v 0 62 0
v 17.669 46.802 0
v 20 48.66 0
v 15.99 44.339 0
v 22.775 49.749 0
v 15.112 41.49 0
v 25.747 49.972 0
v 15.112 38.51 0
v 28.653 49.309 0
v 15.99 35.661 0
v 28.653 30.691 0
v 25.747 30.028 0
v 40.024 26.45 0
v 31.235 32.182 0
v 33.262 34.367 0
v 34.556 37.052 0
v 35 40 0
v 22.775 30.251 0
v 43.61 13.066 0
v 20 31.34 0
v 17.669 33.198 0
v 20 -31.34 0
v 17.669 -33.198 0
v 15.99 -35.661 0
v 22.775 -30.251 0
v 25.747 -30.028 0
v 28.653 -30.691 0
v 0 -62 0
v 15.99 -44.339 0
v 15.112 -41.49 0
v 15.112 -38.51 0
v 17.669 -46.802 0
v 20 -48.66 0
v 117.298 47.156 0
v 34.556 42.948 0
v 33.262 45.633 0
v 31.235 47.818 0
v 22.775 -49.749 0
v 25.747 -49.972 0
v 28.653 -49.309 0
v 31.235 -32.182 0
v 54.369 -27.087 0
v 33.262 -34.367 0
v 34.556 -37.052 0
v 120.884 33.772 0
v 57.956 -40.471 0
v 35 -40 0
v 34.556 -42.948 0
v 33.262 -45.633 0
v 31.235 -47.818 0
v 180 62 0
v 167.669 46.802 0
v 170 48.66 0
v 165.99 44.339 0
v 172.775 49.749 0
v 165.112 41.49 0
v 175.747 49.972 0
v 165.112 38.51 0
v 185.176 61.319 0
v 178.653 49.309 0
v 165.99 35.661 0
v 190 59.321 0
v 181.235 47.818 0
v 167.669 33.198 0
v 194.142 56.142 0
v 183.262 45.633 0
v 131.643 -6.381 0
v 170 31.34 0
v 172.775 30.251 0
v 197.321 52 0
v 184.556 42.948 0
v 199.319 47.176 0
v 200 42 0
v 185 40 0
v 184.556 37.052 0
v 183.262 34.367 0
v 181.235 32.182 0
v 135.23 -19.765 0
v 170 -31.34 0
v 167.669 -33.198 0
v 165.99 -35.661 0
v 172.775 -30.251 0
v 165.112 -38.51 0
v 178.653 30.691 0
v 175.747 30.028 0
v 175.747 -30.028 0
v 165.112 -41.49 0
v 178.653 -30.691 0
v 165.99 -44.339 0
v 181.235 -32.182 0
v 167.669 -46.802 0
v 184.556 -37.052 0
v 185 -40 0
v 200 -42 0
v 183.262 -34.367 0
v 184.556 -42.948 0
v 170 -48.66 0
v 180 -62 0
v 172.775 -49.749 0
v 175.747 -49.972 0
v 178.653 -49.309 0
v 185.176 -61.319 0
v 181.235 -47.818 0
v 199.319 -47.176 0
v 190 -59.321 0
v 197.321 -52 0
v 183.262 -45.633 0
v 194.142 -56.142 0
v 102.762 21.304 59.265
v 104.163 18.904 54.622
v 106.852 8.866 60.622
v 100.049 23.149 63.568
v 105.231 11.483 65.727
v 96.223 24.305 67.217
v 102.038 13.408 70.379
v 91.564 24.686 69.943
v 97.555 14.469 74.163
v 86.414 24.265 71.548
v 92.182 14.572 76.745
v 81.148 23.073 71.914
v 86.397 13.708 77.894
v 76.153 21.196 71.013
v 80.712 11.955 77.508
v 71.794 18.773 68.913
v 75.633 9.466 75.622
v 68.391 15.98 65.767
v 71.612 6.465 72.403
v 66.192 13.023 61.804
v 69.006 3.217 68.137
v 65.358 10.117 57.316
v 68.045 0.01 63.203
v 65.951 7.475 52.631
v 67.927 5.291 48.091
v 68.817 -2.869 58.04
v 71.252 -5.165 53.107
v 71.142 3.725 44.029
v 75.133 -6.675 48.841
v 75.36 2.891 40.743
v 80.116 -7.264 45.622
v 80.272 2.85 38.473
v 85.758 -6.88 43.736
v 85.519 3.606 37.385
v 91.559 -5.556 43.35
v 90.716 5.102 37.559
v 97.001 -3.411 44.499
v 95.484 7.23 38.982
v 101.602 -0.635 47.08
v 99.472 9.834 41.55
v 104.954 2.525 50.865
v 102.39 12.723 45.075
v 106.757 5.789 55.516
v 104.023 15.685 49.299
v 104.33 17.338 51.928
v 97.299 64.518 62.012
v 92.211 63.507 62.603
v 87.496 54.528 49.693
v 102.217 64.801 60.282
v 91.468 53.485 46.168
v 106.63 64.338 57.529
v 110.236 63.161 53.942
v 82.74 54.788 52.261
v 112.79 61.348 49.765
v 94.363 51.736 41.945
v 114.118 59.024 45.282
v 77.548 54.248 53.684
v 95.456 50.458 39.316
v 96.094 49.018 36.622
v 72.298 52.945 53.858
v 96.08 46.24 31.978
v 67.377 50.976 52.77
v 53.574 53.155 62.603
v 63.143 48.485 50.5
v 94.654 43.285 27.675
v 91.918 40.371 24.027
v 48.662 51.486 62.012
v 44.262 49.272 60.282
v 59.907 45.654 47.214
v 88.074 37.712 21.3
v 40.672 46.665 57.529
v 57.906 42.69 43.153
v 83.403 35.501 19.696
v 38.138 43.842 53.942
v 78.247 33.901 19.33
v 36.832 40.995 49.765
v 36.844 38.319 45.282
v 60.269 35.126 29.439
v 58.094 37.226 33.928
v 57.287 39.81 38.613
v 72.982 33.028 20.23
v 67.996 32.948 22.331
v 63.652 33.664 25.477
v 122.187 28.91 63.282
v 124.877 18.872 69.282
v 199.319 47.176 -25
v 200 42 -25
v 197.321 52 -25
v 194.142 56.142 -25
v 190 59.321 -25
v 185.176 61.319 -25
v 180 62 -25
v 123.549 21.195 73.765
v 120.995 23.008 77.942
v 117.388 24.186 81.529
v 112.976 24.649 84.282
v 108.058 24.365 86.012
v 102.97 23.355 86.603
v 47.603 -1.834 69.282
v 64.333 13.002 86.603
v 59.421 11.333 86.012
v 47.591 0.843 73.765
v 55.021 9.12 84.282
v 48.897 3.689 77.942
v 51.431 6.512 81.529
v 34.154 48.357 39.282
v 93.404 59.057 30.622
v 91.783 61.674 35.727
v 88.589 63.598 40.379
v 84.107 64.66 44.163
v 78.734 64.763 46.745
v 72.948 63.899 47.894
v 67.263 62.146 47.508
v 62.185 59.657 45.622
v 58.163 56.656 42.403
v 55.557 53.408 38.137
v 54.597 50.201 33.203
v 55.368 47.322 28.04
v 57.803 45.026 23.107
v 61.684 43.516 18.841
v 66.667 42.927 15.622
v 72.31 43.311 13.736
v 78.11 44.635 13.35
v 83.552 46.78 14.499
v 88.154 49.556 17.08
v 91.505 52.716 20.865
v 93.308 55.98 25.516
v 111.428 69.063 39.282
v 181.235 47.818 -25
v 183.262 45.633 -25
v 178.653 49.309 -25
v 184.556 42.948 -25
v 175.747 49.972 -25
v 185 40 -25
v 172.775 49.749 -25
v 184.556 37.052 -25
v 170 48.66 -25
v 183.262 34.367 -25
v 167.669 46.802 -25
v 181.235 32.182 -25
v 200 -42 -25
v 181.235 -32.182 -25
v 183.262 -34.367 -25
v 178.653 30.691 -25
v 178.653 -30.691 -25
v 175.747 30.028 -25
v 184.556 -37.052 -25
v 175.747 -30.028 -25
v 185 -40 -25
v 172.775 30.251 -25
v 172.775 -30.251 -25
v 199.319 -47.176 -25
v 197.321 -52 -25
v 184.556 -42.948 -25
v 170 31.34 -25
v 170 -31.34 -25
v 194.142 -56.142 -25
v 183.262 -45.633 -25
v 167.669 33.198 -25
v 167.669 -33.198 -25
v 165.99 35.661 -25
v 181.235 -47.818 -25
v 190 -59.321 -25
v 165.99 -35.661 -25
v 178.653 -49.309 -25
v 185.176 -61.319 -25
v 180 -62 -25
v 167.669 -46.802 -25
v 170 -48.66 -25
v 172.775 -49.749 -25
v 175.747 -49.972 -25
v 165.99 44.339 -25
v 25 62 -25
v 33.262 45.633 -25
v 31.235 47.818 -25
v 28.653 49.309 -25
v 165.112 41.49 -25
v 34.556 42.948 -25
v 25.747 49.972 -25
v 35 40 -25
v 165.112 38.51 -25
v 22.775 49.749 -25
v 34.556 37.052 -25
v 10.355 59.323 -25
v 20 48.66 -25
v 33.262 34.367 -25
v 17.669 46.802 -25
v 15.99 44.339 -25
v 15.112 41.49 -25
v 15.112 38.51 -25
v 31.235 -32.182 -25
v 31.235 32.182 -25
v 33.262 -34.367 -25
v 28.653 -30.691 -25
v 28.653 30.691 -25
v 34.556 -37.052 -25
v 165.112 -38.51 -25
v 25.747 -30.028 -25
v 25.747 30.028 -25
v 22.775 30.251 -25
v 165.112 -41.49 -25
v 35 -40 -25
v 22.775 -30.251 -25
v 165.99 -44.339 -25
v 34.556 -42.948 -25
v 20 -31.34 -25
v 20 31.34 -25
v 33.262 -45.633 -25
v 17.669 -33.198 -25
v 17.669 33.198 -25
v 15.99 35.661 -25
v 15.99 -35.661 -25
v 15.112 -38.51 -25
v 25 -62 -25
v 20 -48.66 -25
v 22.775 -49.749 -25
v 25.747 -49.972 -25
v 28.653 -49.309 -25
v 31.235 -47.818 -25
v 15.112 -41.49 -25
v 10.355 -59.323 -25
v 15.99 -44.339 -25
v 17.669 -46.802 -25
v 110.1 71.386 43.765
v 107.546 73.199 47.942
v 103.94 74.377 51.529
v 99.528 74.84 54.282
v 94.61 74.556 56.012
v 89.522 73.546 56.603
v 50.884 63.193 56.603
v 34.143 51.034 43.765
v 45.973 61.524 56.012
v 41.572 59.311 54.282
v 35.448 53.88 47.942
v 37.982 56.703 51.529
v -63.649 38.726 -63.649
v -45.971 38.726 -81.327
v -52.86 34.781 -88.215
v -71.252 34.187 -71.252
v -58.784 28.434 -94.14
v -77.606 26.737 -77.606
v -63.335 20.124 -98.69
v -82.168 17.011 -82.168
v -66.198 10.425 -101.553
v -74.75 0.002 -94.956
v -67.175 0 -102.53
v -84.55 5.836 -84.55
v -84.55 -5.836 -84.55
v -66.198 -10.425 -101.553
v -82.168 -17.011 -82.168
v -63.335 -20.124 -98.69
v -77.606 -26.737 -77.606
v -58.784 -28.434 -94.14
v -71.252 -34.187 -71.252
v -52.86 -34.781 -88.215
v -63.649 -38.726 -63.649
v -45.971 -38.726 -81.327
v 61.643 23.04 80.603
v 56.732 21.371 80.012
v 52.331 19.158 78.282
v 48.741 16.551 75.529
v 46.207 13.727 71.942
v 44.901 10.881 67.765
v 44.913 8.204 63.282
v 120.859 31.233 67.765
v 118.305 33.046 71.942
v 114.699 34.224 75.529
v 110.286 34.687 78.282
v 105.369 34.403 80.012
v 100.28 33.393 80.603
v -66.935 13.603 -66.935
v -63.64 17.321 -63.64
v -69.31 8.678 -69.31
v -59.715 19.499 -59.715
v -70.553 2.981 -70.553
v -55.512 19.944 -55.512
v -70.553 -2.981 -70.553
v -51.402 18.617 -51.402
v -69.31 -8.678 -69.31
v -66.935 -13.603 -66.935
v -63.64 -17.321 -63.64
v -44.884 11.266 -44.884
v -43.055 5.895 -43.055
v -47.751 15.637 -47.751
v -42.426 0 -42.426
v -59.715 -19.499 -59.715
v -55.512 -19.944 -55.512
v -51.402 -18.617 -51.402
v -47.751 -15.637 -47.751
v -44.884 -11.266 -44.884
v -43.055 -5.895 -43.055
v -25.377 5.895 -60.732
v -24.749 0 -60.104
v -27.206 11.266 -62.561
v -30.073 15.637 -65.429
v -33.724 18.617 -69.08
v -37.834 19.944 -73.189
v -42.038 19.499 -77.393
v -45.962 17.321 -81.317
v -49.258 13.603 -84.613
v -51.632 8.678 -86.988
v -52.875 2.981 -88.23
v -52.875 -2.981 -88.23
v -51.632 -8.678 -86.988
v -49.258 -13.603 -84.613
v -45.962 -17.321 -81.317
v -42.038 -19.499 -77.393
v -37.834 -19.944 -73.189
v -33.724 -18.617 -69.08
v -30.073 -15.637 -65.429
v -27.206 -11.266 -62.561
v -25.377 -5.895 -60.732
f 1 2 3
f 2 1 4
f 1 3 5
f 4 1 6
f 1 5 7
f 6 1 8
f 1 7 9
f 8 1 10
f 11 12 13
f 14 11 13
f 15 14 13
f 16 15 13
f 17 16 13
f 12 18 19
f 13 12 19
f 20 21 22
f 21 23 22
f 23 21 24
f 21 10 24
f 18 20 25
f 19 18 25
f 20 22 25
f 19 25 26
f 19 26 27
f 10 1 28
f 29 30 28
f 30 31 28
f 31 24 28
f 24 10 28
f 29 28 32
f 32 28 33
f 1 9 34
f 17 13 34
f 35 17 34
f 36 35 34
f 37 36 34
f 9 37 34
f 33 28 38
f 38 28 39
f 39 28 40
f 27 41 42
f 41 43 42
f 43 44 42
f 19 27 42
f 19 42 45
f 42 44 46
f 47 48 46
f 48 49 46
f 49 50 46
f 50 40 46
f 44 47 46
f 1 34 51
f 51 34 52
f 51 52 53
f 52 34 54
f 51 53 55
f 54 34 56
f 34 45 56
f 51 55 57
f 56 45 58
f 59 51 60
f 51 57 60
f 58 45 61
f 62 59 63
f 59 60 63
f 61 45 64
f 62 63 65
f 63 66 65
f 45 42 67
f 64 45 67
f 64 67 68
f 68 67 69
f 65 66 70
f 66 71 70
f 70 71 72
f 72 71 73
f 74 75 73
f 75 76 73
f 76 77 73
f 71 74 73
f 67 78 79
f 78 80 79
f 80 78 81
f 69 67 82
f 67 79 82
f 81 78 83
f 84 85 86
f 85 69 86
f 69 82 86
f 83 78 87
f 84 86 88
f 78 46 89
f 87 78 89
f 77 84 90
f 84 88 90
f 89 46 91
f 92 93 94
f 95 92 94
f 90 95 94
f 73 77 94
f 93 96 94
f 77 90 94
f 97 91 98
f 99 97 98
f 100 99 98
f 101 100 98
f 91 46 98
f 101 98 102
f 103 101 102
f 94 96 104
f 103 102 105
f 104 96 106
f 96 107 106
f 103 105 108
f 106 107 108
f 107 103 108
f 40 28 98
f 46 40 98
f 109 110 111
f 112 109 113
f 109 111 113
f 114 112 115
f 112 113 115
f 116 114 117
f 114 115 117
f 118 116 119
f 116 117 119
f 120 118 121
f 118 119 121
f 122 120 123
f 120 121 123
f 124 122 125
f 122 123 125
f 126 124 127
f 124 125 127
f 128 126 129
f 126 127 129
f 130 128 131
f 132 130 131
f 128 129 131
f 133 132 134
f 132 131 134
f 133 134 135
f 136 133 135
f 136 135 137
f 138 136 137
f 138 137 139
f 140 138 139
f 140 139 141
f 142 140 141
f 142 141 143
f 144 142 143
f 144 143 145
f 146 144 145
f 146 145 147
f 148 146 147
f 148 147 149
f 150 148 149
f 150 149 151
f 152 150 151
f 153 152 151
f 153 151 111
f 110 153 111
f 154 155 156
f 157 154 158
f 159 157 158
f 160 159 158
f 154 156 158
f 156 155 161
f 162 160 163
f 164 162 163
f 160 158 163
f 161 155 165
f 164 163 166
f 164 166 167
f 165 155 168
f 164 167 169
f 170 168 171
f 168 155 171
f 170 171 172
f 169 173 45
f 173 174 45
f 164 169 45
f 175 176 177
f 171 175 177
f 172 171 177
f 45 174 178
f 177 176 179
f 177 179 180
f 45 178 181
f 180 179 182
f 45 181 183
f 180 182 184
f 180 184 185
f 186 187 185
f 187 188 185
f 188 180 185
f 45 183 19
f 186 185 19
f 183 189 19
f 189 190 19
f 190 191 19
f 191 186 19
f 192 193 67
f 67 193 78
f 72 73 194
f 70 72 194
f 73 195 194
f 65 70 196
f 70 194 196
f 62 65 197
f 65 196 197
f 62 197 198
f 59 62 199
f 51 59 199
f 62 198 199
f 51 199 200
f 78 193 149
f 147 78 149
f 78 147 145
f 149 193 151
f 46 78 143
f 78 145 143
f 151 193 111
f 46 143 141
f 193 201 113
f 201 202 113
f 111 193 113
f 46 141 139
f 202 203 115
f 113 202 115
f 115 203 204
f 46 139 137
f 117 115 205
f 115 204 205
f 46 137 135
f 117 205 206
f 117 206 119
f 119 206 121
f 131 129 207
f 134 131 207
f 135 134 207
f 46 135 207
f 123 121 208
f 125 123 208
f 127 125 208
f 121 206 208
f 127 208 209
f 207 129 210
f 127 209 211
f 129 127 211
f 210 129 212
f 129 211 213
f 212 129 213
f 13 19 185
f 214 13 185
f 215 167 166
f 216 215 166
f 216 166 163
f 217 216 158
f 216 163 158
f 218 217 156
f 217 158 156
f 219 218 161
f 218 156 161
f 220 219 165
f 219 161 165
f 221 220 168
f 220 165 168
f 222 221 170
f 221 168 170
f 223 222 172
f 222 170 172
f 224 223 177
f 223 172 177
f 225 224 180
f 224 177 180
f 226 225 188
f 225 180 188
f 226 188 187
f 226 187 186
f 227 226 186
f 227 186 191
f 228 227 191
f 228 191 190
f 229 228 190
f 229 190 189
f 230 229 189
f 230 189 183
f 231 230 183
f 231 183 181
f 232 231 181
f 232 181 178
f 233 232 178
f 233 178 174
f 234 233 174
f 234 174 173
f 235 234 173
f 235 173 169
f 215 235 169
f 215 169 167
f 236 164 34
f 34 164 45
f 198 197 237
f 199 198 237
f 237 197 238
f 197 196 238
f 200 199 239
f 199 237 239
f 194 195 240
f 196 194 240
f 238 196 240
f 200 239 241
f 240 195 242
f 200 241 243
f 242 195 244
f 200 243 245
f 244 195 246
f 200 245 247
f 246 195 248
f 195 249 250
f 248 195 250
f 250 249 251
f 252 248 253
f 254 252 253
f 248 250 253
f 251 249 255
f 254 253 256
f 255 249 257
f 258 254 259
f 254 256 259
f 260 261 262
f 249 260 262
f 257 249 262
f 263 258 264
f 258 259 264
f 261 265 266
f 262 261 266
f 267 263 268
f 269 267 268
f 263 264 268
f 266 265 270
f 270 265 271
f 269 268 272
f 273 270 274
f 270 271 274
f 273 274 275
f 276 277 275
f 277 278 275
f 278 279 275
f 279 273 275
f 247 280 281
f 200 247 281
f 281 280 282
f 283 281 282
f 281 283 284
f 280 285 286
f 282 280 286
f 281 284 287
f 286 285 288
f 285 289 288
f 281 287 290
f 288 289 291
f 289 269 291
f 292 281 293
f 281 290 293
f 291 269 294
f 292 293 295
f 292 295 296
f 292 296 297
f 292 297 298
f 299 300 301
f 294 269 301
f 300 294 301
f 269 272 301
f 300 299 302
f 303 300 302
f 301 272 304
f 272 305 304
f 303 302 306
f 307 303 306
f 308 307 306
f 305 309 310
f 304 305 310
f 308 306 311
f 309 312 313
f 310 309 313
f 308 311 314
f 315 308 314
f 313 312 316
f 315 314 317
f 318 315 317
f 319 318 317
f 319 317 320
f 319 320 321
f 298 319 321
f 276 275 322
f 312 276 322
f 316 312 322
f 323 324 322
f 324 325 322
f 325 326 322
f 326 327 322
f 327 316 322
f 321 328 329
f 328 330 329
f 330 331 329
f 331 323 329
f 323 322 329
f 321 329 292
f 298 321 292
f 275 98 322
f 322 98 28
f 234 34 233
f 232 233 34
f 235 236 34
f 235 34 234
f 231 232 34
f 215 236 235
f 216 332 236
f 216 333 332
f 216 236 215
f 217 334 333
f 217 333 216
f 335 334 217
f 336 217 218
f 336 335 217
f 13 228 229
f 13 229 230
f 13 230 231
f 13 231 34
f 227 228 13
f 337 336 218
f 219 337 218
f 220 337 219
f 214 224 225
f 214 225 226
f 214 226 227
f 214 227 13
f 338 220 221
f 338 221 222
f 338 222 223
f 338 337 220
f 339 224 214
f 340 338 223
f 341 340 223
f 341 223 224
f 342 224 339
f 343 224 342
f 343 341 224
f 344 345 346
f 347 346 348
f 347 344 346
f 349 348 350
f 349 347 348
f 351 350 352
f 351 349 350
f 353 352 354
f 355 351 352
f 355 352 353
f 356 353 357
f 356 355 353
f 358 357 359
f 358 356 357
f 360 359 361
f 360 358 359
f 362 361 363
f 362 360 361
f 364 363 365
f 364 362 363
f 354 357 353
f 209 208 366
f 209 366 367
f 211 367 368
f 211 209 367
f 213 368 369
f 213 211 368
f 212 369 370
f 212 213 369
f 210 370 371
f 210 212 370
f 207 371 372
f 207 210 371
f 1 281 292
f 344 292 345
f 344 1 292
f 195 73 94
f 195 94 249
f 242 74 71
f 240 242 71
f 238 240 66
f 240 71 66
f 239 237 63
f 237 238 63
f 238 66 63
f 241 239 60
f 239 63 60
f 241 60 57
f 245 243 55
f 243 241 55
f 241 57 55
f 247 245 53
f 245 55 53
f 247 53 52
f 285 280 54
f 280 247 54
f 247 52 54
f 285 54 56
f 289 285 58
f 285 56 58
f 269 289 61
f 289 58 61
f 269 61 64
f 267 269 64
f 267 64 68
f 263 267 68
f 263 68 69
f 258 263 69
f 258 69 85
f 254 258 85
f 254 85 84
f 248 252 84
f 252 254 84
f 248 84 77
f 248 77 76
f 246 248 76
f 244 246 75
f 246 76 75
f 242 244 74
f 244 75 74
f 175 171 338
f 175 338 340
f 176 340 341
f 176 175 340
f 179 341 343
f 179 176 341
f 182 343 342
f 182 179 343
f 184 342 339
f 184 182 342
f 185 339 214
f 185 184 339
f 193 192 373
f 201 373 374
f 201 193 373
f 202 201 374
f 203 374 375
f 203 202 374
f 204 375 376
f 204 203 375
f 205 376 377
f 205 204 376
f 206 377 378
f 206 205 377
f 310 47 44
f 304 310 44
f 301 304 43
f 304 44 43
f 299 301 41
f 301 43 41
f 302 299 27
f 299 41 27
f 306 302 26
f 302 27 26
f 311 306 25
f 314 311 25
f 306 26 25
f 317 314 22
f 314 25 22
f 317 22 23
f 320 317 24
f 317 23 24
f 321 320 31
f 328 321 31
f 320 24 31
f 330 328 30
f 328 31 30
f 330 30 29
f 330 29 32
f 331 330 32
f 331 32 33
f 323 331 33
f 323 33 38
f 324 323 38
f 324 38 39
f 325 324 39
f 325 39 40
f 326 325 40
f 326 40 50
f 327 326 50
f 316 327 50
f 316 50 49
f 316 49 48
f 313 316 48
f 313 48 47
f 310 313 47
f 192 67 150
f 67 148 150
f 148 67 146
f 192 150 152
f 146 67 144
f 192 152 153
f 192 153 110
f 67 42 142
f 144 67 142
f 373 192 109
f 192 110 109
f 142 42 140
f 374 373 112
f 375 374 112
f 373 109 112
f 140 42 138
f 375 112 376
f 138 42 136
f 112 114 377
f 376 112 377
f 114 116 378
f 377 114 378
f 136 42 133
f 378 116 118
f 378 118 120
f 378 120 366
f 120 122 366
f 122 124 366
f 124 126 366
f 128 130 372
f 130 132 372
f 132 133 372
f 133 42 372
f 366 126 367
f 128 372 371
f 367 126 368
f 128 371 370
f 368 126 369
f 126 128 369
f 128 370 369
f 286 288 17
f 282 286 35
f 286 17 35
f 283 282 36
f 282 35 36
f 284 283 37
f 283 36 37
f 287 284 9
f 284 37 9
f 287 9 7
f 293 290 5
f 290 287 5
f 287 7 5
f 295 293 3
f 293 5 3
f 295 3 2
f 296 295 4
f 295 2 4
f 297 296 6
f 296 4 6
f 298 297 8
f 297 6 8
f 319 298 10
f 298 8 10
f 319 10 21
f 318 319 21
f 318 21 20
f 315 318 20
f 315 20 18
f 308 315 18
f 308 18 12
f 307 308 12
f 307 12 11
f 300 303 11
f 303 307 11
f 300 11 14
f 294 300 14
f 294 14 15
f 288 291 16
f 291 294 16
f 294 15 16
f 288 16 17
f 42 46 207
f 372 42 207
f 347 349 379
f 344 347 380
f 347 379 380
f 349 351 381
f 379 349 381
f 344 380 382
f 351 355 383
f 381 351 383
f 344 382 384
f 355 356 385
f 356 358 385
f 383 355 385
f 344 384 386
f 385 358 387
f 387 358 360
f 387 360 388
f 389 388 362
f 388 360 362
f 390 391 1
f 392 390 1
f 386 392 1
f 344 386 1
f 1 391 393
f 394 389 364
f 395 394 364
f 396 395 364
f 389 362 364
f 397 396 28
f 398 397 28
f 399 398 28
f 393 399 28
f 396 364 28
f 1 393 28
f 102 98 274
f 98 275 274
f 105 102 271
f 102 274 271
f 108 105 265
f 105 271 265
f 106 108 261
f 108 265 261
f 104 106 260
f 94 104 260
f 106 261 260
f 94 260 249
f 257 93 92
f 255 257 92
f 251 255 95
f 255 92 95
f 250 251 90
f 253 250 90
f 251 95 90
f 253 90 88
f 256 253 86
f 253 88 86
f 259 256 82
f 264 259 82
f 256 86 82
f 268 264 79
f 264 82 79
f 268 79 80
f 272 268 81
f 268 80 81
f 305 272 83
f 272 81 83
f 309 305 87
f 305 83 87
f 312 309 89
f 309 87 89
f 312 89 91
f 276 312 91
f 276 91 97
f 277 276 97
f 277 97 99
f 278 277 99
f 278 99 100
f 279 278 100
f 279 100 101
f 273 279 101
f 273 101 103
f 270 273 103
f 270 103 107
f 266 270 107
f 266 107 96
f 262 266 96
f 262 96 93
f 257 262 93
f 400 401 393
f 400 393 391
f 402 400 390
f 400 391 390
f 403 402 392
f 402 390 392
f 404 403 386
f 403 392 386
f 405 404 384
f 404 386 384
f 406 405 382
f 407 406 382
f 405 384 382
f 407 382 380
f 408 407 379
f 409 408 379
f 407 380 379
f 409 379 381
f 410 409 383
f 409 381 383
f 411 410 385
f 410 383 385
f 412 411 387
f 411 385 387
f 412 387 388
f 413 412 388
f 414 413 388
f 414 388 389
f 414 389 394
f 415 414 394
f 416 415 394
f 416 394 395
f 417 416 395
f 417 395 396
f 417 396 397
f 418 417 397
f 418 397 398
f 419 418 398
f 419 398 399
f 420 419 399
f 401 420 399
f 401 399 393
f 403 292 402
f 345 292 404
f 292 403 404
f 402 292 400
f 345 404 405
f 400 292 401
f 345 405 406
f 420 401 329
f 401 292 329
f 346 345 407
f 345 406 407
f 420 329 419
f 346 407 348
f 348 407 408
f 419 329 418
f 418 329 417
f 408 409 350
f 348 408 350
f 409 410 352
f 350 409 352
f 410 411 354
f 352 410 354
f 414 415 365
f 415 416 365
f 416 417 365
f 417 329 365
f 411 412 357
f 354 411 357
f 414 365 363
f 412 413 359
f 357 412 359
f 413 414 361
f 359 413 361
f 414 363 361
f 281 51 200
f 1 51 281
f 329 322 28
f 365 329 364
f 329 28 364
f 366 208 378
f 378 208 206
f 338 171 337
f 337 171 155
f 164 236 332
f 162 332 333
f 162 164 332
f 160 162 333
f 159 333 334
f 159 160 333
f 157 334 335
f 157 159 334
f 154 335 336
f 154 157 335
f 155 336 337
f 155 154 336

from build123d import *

# Parameters (mm, degrees)
PAD_DEPTH            = 62
POCKET_DEPTH         = 213.922356
SKETCH002_R          = 20
POCKET001_DEPTH      = 213.922356
SKETCH003_R          = 10
POCKET002_DEPTH      = 102.531483
POCKET002_DEPTH_BACK = 0.001
PAD001_DEPTH         = 60
SKETCH005_R          = 20
POCKET003_DEPTH      = 60
POCKET004_DEPTH      = 212.557512
SKETCH007_W          = 150
SKETCH007_H          = 20
POCKET005_DEPTH      = 74.846137
FILLET_R             = 20


with BuildPart() as part:
    # Sketch → Pad (new body, symmetric)
    with BuildSketch(Plane.XZ):
        Polygon((0, 0), (200, 0), (200, -25), (10.355339, -25), (-67.175144, -102.530483), (-84.852814, -84.852814), align=None)
    extrude(amount=PAD_DEPTH, both=True)

    # Sketch001 (on DatumPlane) → Pocket (cut, through all)
    with BuildSketch(Plane(origin=(0, 0, 0), x_dir=(0.707107, 0, 0.707107), z_dir=(-0.707107, 0, 0.707107))):
        with BuildLine():
            Line((-130, 62), (0, 62))
            Line((0, 62), (-90.013078, 38.726454))
            ThreePointArc((-90.013078, 38.726454), (-120, 0), (-90.013078, -38.726454))
            Line((0, -62), (-90.013078, -38.726454))
            Line((0, -62), (-130, -62))
            Line((-130, -62), (-130, 62))
        make_face()
    extrude(amount=-POCKET_DEPTH, mode=Mode.SUBTRACT)

    # Sketch002 (on DatumPlane) → Pocket001 (cut, through all)
    with BuildSketch(Plane(origin=(0, 0, 0), x_dir=(0.707107, 0, 0.707107), z_dir=(-0.707107, 0, 0.707107))):
        with Locations((-80, 0)):
            Circle(SKETCH002_R)
    extrude(amount=-POCKET001_DEPTH, mode=Mode.SUBTRACT)

    # Sketch003 → Pocket002 (cut, two sides)
    with BuildSketch(Plane.XY) as pocket002_sk:
        with Locations((25, 40)):
            Circle(SKETCH003_R)
        with Locations((175, 40)):
            Circle(SKETCH003_R)
        with Locations((175, -40)):
            Circle(SKETCH003_R)
        with Locations((25, -40)):
            Circle(SKETCH003_R)
    extrude(amount=-POCKET002_DEPTH, mode=Mode.SUBTRACT)
    extrude(pocket002_sk.sketch, amount=POCKET002_DEPTH_BACK, mode=Mode.SUBTRACT)

    # Sketch004 (on DatumPlane) → Pad001 (join)
    with BuildSketch(Plane(origin=(0, -56, 0), x_dir=(0.965926, 0.258819, 0), z_dir=(0.224144, -0.836516, 0.5))):
        with BuildLine():
            Line((140, 79.999939), (140, 0))
            Line((140, 0), (60, 0))
            Line((60, 0), (60, 80.000001))
            ThreePointArc((79.999999, 100), (65.857864, 94.142136), (60, 80.000001))
            Line((79.999999, 100), (120, 100))
            ThreePointArc((140, 79.999939), (134.142157, 94.142114), (120, 100))
        make_face()
    extrude(amount=-PAD001_DEPTH)

    # Sketch005 (on DatumPlane) → Pocket003 (cut)
    with BuildSketch(Plane(origin=(0, -56, 0), x_dir=(0.965926, 0.258819, 0), z_dir=(0.224144, -0.836516, 0.5))):
        with Locations((100, 70)):
            Circle(SKETCH005_R)
    extrude(amount=-POCKET003_DEPTH, mode=Mode.SUBTRACT)

    # Sketch006 (on DatumPlane) → Pocket004 (cut, through all)
    with BuildSketch(Plane(origin=(0, 0, 0), x_dir=(-0.258819, 0.965926, 0), z_dir=(0.965926, 0.258819, 0))):
        Polygon((-40.23544, 0), (6.300459, 80.60254), (37.477373, 62.60254), (1.33378, 0), align=None)
    extrude(amount=POCKET004_DEPTH, mode=Mode.SUBTRACT)

    # Sketch007 → Pocket005 (cut, through all)
    with BuildSketch(Plane.XZ):
        with Locations((90, -35)):
            Rectangle(SKETCH007_W, SKETCH007_H)
    extrude(amount=-POCKET005_DEPTH, mode=Mode.SUBTRACT)

    # Fillet
    fillet_edges = [part.edges().sort_by_distance(p)[0] for p in [
        (200, -62, -12.5),
        (200, 62, -12.5),
    ]]
    fillet(fillet_edges, radius=FILLET_R)


solid = part.part
